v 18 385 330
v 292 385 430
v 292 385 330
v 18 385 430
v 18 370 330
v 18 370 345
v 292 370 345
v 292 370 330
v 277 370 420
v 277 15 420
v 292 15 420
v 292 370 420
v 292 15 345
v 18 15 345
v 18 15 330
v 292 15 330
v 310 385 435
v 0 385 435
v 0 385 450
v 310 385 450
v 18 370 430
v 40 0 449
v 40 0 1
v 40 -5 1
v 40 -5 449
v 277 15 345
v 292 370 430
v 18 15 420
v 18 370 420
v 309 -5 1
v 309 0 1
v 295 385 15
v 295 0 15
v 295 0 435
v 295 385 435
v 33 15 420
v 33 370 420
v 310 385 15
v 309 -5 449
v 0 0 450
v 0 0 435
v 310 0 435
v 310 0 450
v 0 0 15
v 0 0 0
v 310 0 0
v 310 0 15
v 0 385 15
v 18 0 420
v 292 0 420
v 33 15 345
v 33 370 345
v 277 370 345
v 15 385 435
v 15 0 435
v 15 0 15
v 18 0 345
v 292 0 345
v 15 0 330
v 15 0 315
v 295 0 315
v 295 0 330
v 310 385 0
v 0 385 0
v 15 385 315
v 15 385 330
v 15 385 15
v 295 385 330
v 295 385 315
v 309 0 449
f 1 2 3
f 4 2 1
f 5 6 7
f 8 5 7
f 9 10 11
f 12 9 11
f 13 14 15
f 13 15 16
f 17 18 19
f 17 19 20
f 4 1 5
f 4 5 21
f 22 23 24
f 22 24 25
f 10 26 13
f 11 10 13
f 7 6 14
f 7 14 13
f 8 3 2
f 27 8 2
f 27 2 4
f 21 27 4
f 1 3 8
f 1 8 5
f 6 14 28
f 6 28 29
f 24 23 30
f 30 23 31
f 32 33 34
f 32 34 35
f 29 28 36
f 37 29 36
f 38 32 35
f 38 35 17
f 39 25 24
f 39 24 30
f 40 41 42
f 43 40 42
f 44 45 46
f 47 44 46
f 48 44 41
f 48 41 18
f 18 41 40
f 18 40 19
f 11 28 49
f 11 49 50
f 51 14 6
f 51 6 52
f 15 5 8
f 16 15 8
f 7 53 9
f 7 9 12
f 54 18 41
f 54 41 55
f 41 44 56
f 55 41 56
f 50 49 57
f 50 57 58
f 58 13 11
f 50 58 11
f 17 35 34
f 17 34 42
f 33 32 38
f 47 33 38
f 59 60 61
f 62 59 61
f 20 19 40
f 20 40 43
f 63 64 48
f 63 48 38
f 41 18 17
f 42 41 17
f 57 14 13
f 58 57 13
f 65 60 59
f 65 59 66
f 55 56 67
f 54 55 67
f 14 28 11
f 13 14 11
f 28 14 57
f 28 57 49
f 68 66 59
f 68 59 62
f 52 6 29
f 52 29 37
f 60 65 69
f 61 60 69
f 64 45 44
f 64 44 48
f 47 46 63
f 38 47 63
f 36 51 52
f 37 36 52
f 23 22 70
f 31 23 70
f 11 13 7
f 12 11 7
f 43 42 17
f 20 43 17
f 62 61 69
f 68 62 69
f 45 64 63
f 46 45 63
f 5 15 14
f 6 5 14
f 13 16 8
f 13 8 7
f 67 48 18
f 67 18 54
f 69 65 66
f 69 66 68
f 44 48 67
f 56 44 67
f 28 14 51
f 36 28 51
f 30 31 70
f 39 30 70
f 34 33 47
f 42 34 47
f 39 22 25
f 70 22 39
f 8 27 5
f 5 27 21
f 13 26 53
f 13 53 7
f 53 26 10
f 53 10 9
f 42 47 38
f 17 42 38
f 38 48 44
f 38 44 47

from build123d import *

# Parameters (mm, degrees)
F0_W      = 310
F0_H      = 385
F1_DEPTH  = 15
F2_W      = 15
F2_H      = 385
F3_DEPTH  = 420
F5_W      = 280
F5_H      = 385
F6_DEPTH  = 15
F7_W      = 310
F7_H      = 385
F8_DEPTH  = 15
F9_W      = 269
F9_H      = 448
F10_DEPTH = 5
F11_W     = 274
F11_H     = 100
F12_DEPTH = 15
F13_W     = 274
F13_H     = 15
F14_DEPTH = 355
F15_W     = 274
F15_H     = 75
F16_DEPTH = 15
F17_W     = 15
F17_H     = 355
F18_DEPTH = 75


with BuildPart() as f1:
    # F0 (on Top) → F1 (new body)
    with BuildSketch(Plane.XY):
        with Locations((155, 192.5)):
            Rectangle(F0_W, F0_H)
    extrude(amount=F1_DEPTH)


with BuildPart() as f3:
    # F2 (on face) → F3 (new body)
    with BuildSketch(Plane.XY.offset(15)):
        with Locations((7.5, 192.5)):
            Rectangle(F2_W, F2_H)
    extrude(amount=F3_DEPTH)


with BuildPart() as f3b:
    # F2 (on face) → F3, piece 2 (new body)
    with BuildSketch(Plane.XY.offset(15)):
        with Locations((302.5, 192.5)):
            Rectangle(F2_W, F2_H)
    extrude(amount=F3_DEPTH)


with BuildPart() as f6:
    # F5 (on offset) → F6 (new body)
    with BuildSketch(Plane.XY.offset(315)):
        with Locations((155, 192.5)):
            Rectangle(F5_W, F5_H)
    extrude(amount=F6_DEPTH)


with BuildPart() as f8:
    # F7 (on face) → F8 (new body)
    with BuildSketch(Plane.XY.offset(435)):
        with Locations((155, 192.5)):
            Rectangle(F7_W, F7_H)
    extrude(amount=F8_DEPTH)


with BuildPart() as f10:
    # F9 (on face) → F10 (new body)
    with BuildSketch(Plane.XZ):
        with Locations((174.5, 225)):
            Rectangle(F9_W, F9_H)
    extrude(amount=F10_DEPTH)


with BuildPart() as f12:
    # F11 (on face) → F12 (new body)
    with BuildSketch(Plane(origin=(0, 385, 0), x_dir=(-1, 0, 0), z_dir=(0, 1, 0))):
        with Locations((-155, 380)):
            Rectangle(F11_W, F11_H)
    extrude(amount=-F12_DEPTH)


with BuildPart() as f14:
    # F13 (on face) → F14 (new body)
    with BuildSketch(Plane.XZ.offset(-370)):
        with Locations((155, 337.5)):
            Rectangle(F13_W, F13_H)
    extrude(amount=F14_DEPTH)


with BuildPart() as f16:
    # F15 (on face) → F16 (new body)
    with BuildSketch(Plane.XZ.offset(-15)):
        with Locations((155, 382.5)):
            Rectangle(F15_W, F15_H)
    extrude(amount=F16_DEPTH)


with BuildPart() as f18:
    # F17 (on face) → F18 (new body)
    with BuildSketch(Plane.XY.offset(345)):
        with Locations((25.5, 192.5)):
            Rectangle(F17_W, F17_H)
    extrude(amount=F18_DEPTH)


with BuildPart() as f18b:
    # F17 (on face) → F18, piece 2 (new body)
    with BuildSketch(Plane.XY.offset(345)):
        with Locations((284.5, 192.5)):
            Rectangle(F17_W, F17_H)
    extrude(amount=F18_DEPTH)


solid = Compound([f1.part, f3.part, f3b.part, f6.part, f8.part, f10.part, f12.part, f14.part, f16.part, f18.part, f18b.part])
